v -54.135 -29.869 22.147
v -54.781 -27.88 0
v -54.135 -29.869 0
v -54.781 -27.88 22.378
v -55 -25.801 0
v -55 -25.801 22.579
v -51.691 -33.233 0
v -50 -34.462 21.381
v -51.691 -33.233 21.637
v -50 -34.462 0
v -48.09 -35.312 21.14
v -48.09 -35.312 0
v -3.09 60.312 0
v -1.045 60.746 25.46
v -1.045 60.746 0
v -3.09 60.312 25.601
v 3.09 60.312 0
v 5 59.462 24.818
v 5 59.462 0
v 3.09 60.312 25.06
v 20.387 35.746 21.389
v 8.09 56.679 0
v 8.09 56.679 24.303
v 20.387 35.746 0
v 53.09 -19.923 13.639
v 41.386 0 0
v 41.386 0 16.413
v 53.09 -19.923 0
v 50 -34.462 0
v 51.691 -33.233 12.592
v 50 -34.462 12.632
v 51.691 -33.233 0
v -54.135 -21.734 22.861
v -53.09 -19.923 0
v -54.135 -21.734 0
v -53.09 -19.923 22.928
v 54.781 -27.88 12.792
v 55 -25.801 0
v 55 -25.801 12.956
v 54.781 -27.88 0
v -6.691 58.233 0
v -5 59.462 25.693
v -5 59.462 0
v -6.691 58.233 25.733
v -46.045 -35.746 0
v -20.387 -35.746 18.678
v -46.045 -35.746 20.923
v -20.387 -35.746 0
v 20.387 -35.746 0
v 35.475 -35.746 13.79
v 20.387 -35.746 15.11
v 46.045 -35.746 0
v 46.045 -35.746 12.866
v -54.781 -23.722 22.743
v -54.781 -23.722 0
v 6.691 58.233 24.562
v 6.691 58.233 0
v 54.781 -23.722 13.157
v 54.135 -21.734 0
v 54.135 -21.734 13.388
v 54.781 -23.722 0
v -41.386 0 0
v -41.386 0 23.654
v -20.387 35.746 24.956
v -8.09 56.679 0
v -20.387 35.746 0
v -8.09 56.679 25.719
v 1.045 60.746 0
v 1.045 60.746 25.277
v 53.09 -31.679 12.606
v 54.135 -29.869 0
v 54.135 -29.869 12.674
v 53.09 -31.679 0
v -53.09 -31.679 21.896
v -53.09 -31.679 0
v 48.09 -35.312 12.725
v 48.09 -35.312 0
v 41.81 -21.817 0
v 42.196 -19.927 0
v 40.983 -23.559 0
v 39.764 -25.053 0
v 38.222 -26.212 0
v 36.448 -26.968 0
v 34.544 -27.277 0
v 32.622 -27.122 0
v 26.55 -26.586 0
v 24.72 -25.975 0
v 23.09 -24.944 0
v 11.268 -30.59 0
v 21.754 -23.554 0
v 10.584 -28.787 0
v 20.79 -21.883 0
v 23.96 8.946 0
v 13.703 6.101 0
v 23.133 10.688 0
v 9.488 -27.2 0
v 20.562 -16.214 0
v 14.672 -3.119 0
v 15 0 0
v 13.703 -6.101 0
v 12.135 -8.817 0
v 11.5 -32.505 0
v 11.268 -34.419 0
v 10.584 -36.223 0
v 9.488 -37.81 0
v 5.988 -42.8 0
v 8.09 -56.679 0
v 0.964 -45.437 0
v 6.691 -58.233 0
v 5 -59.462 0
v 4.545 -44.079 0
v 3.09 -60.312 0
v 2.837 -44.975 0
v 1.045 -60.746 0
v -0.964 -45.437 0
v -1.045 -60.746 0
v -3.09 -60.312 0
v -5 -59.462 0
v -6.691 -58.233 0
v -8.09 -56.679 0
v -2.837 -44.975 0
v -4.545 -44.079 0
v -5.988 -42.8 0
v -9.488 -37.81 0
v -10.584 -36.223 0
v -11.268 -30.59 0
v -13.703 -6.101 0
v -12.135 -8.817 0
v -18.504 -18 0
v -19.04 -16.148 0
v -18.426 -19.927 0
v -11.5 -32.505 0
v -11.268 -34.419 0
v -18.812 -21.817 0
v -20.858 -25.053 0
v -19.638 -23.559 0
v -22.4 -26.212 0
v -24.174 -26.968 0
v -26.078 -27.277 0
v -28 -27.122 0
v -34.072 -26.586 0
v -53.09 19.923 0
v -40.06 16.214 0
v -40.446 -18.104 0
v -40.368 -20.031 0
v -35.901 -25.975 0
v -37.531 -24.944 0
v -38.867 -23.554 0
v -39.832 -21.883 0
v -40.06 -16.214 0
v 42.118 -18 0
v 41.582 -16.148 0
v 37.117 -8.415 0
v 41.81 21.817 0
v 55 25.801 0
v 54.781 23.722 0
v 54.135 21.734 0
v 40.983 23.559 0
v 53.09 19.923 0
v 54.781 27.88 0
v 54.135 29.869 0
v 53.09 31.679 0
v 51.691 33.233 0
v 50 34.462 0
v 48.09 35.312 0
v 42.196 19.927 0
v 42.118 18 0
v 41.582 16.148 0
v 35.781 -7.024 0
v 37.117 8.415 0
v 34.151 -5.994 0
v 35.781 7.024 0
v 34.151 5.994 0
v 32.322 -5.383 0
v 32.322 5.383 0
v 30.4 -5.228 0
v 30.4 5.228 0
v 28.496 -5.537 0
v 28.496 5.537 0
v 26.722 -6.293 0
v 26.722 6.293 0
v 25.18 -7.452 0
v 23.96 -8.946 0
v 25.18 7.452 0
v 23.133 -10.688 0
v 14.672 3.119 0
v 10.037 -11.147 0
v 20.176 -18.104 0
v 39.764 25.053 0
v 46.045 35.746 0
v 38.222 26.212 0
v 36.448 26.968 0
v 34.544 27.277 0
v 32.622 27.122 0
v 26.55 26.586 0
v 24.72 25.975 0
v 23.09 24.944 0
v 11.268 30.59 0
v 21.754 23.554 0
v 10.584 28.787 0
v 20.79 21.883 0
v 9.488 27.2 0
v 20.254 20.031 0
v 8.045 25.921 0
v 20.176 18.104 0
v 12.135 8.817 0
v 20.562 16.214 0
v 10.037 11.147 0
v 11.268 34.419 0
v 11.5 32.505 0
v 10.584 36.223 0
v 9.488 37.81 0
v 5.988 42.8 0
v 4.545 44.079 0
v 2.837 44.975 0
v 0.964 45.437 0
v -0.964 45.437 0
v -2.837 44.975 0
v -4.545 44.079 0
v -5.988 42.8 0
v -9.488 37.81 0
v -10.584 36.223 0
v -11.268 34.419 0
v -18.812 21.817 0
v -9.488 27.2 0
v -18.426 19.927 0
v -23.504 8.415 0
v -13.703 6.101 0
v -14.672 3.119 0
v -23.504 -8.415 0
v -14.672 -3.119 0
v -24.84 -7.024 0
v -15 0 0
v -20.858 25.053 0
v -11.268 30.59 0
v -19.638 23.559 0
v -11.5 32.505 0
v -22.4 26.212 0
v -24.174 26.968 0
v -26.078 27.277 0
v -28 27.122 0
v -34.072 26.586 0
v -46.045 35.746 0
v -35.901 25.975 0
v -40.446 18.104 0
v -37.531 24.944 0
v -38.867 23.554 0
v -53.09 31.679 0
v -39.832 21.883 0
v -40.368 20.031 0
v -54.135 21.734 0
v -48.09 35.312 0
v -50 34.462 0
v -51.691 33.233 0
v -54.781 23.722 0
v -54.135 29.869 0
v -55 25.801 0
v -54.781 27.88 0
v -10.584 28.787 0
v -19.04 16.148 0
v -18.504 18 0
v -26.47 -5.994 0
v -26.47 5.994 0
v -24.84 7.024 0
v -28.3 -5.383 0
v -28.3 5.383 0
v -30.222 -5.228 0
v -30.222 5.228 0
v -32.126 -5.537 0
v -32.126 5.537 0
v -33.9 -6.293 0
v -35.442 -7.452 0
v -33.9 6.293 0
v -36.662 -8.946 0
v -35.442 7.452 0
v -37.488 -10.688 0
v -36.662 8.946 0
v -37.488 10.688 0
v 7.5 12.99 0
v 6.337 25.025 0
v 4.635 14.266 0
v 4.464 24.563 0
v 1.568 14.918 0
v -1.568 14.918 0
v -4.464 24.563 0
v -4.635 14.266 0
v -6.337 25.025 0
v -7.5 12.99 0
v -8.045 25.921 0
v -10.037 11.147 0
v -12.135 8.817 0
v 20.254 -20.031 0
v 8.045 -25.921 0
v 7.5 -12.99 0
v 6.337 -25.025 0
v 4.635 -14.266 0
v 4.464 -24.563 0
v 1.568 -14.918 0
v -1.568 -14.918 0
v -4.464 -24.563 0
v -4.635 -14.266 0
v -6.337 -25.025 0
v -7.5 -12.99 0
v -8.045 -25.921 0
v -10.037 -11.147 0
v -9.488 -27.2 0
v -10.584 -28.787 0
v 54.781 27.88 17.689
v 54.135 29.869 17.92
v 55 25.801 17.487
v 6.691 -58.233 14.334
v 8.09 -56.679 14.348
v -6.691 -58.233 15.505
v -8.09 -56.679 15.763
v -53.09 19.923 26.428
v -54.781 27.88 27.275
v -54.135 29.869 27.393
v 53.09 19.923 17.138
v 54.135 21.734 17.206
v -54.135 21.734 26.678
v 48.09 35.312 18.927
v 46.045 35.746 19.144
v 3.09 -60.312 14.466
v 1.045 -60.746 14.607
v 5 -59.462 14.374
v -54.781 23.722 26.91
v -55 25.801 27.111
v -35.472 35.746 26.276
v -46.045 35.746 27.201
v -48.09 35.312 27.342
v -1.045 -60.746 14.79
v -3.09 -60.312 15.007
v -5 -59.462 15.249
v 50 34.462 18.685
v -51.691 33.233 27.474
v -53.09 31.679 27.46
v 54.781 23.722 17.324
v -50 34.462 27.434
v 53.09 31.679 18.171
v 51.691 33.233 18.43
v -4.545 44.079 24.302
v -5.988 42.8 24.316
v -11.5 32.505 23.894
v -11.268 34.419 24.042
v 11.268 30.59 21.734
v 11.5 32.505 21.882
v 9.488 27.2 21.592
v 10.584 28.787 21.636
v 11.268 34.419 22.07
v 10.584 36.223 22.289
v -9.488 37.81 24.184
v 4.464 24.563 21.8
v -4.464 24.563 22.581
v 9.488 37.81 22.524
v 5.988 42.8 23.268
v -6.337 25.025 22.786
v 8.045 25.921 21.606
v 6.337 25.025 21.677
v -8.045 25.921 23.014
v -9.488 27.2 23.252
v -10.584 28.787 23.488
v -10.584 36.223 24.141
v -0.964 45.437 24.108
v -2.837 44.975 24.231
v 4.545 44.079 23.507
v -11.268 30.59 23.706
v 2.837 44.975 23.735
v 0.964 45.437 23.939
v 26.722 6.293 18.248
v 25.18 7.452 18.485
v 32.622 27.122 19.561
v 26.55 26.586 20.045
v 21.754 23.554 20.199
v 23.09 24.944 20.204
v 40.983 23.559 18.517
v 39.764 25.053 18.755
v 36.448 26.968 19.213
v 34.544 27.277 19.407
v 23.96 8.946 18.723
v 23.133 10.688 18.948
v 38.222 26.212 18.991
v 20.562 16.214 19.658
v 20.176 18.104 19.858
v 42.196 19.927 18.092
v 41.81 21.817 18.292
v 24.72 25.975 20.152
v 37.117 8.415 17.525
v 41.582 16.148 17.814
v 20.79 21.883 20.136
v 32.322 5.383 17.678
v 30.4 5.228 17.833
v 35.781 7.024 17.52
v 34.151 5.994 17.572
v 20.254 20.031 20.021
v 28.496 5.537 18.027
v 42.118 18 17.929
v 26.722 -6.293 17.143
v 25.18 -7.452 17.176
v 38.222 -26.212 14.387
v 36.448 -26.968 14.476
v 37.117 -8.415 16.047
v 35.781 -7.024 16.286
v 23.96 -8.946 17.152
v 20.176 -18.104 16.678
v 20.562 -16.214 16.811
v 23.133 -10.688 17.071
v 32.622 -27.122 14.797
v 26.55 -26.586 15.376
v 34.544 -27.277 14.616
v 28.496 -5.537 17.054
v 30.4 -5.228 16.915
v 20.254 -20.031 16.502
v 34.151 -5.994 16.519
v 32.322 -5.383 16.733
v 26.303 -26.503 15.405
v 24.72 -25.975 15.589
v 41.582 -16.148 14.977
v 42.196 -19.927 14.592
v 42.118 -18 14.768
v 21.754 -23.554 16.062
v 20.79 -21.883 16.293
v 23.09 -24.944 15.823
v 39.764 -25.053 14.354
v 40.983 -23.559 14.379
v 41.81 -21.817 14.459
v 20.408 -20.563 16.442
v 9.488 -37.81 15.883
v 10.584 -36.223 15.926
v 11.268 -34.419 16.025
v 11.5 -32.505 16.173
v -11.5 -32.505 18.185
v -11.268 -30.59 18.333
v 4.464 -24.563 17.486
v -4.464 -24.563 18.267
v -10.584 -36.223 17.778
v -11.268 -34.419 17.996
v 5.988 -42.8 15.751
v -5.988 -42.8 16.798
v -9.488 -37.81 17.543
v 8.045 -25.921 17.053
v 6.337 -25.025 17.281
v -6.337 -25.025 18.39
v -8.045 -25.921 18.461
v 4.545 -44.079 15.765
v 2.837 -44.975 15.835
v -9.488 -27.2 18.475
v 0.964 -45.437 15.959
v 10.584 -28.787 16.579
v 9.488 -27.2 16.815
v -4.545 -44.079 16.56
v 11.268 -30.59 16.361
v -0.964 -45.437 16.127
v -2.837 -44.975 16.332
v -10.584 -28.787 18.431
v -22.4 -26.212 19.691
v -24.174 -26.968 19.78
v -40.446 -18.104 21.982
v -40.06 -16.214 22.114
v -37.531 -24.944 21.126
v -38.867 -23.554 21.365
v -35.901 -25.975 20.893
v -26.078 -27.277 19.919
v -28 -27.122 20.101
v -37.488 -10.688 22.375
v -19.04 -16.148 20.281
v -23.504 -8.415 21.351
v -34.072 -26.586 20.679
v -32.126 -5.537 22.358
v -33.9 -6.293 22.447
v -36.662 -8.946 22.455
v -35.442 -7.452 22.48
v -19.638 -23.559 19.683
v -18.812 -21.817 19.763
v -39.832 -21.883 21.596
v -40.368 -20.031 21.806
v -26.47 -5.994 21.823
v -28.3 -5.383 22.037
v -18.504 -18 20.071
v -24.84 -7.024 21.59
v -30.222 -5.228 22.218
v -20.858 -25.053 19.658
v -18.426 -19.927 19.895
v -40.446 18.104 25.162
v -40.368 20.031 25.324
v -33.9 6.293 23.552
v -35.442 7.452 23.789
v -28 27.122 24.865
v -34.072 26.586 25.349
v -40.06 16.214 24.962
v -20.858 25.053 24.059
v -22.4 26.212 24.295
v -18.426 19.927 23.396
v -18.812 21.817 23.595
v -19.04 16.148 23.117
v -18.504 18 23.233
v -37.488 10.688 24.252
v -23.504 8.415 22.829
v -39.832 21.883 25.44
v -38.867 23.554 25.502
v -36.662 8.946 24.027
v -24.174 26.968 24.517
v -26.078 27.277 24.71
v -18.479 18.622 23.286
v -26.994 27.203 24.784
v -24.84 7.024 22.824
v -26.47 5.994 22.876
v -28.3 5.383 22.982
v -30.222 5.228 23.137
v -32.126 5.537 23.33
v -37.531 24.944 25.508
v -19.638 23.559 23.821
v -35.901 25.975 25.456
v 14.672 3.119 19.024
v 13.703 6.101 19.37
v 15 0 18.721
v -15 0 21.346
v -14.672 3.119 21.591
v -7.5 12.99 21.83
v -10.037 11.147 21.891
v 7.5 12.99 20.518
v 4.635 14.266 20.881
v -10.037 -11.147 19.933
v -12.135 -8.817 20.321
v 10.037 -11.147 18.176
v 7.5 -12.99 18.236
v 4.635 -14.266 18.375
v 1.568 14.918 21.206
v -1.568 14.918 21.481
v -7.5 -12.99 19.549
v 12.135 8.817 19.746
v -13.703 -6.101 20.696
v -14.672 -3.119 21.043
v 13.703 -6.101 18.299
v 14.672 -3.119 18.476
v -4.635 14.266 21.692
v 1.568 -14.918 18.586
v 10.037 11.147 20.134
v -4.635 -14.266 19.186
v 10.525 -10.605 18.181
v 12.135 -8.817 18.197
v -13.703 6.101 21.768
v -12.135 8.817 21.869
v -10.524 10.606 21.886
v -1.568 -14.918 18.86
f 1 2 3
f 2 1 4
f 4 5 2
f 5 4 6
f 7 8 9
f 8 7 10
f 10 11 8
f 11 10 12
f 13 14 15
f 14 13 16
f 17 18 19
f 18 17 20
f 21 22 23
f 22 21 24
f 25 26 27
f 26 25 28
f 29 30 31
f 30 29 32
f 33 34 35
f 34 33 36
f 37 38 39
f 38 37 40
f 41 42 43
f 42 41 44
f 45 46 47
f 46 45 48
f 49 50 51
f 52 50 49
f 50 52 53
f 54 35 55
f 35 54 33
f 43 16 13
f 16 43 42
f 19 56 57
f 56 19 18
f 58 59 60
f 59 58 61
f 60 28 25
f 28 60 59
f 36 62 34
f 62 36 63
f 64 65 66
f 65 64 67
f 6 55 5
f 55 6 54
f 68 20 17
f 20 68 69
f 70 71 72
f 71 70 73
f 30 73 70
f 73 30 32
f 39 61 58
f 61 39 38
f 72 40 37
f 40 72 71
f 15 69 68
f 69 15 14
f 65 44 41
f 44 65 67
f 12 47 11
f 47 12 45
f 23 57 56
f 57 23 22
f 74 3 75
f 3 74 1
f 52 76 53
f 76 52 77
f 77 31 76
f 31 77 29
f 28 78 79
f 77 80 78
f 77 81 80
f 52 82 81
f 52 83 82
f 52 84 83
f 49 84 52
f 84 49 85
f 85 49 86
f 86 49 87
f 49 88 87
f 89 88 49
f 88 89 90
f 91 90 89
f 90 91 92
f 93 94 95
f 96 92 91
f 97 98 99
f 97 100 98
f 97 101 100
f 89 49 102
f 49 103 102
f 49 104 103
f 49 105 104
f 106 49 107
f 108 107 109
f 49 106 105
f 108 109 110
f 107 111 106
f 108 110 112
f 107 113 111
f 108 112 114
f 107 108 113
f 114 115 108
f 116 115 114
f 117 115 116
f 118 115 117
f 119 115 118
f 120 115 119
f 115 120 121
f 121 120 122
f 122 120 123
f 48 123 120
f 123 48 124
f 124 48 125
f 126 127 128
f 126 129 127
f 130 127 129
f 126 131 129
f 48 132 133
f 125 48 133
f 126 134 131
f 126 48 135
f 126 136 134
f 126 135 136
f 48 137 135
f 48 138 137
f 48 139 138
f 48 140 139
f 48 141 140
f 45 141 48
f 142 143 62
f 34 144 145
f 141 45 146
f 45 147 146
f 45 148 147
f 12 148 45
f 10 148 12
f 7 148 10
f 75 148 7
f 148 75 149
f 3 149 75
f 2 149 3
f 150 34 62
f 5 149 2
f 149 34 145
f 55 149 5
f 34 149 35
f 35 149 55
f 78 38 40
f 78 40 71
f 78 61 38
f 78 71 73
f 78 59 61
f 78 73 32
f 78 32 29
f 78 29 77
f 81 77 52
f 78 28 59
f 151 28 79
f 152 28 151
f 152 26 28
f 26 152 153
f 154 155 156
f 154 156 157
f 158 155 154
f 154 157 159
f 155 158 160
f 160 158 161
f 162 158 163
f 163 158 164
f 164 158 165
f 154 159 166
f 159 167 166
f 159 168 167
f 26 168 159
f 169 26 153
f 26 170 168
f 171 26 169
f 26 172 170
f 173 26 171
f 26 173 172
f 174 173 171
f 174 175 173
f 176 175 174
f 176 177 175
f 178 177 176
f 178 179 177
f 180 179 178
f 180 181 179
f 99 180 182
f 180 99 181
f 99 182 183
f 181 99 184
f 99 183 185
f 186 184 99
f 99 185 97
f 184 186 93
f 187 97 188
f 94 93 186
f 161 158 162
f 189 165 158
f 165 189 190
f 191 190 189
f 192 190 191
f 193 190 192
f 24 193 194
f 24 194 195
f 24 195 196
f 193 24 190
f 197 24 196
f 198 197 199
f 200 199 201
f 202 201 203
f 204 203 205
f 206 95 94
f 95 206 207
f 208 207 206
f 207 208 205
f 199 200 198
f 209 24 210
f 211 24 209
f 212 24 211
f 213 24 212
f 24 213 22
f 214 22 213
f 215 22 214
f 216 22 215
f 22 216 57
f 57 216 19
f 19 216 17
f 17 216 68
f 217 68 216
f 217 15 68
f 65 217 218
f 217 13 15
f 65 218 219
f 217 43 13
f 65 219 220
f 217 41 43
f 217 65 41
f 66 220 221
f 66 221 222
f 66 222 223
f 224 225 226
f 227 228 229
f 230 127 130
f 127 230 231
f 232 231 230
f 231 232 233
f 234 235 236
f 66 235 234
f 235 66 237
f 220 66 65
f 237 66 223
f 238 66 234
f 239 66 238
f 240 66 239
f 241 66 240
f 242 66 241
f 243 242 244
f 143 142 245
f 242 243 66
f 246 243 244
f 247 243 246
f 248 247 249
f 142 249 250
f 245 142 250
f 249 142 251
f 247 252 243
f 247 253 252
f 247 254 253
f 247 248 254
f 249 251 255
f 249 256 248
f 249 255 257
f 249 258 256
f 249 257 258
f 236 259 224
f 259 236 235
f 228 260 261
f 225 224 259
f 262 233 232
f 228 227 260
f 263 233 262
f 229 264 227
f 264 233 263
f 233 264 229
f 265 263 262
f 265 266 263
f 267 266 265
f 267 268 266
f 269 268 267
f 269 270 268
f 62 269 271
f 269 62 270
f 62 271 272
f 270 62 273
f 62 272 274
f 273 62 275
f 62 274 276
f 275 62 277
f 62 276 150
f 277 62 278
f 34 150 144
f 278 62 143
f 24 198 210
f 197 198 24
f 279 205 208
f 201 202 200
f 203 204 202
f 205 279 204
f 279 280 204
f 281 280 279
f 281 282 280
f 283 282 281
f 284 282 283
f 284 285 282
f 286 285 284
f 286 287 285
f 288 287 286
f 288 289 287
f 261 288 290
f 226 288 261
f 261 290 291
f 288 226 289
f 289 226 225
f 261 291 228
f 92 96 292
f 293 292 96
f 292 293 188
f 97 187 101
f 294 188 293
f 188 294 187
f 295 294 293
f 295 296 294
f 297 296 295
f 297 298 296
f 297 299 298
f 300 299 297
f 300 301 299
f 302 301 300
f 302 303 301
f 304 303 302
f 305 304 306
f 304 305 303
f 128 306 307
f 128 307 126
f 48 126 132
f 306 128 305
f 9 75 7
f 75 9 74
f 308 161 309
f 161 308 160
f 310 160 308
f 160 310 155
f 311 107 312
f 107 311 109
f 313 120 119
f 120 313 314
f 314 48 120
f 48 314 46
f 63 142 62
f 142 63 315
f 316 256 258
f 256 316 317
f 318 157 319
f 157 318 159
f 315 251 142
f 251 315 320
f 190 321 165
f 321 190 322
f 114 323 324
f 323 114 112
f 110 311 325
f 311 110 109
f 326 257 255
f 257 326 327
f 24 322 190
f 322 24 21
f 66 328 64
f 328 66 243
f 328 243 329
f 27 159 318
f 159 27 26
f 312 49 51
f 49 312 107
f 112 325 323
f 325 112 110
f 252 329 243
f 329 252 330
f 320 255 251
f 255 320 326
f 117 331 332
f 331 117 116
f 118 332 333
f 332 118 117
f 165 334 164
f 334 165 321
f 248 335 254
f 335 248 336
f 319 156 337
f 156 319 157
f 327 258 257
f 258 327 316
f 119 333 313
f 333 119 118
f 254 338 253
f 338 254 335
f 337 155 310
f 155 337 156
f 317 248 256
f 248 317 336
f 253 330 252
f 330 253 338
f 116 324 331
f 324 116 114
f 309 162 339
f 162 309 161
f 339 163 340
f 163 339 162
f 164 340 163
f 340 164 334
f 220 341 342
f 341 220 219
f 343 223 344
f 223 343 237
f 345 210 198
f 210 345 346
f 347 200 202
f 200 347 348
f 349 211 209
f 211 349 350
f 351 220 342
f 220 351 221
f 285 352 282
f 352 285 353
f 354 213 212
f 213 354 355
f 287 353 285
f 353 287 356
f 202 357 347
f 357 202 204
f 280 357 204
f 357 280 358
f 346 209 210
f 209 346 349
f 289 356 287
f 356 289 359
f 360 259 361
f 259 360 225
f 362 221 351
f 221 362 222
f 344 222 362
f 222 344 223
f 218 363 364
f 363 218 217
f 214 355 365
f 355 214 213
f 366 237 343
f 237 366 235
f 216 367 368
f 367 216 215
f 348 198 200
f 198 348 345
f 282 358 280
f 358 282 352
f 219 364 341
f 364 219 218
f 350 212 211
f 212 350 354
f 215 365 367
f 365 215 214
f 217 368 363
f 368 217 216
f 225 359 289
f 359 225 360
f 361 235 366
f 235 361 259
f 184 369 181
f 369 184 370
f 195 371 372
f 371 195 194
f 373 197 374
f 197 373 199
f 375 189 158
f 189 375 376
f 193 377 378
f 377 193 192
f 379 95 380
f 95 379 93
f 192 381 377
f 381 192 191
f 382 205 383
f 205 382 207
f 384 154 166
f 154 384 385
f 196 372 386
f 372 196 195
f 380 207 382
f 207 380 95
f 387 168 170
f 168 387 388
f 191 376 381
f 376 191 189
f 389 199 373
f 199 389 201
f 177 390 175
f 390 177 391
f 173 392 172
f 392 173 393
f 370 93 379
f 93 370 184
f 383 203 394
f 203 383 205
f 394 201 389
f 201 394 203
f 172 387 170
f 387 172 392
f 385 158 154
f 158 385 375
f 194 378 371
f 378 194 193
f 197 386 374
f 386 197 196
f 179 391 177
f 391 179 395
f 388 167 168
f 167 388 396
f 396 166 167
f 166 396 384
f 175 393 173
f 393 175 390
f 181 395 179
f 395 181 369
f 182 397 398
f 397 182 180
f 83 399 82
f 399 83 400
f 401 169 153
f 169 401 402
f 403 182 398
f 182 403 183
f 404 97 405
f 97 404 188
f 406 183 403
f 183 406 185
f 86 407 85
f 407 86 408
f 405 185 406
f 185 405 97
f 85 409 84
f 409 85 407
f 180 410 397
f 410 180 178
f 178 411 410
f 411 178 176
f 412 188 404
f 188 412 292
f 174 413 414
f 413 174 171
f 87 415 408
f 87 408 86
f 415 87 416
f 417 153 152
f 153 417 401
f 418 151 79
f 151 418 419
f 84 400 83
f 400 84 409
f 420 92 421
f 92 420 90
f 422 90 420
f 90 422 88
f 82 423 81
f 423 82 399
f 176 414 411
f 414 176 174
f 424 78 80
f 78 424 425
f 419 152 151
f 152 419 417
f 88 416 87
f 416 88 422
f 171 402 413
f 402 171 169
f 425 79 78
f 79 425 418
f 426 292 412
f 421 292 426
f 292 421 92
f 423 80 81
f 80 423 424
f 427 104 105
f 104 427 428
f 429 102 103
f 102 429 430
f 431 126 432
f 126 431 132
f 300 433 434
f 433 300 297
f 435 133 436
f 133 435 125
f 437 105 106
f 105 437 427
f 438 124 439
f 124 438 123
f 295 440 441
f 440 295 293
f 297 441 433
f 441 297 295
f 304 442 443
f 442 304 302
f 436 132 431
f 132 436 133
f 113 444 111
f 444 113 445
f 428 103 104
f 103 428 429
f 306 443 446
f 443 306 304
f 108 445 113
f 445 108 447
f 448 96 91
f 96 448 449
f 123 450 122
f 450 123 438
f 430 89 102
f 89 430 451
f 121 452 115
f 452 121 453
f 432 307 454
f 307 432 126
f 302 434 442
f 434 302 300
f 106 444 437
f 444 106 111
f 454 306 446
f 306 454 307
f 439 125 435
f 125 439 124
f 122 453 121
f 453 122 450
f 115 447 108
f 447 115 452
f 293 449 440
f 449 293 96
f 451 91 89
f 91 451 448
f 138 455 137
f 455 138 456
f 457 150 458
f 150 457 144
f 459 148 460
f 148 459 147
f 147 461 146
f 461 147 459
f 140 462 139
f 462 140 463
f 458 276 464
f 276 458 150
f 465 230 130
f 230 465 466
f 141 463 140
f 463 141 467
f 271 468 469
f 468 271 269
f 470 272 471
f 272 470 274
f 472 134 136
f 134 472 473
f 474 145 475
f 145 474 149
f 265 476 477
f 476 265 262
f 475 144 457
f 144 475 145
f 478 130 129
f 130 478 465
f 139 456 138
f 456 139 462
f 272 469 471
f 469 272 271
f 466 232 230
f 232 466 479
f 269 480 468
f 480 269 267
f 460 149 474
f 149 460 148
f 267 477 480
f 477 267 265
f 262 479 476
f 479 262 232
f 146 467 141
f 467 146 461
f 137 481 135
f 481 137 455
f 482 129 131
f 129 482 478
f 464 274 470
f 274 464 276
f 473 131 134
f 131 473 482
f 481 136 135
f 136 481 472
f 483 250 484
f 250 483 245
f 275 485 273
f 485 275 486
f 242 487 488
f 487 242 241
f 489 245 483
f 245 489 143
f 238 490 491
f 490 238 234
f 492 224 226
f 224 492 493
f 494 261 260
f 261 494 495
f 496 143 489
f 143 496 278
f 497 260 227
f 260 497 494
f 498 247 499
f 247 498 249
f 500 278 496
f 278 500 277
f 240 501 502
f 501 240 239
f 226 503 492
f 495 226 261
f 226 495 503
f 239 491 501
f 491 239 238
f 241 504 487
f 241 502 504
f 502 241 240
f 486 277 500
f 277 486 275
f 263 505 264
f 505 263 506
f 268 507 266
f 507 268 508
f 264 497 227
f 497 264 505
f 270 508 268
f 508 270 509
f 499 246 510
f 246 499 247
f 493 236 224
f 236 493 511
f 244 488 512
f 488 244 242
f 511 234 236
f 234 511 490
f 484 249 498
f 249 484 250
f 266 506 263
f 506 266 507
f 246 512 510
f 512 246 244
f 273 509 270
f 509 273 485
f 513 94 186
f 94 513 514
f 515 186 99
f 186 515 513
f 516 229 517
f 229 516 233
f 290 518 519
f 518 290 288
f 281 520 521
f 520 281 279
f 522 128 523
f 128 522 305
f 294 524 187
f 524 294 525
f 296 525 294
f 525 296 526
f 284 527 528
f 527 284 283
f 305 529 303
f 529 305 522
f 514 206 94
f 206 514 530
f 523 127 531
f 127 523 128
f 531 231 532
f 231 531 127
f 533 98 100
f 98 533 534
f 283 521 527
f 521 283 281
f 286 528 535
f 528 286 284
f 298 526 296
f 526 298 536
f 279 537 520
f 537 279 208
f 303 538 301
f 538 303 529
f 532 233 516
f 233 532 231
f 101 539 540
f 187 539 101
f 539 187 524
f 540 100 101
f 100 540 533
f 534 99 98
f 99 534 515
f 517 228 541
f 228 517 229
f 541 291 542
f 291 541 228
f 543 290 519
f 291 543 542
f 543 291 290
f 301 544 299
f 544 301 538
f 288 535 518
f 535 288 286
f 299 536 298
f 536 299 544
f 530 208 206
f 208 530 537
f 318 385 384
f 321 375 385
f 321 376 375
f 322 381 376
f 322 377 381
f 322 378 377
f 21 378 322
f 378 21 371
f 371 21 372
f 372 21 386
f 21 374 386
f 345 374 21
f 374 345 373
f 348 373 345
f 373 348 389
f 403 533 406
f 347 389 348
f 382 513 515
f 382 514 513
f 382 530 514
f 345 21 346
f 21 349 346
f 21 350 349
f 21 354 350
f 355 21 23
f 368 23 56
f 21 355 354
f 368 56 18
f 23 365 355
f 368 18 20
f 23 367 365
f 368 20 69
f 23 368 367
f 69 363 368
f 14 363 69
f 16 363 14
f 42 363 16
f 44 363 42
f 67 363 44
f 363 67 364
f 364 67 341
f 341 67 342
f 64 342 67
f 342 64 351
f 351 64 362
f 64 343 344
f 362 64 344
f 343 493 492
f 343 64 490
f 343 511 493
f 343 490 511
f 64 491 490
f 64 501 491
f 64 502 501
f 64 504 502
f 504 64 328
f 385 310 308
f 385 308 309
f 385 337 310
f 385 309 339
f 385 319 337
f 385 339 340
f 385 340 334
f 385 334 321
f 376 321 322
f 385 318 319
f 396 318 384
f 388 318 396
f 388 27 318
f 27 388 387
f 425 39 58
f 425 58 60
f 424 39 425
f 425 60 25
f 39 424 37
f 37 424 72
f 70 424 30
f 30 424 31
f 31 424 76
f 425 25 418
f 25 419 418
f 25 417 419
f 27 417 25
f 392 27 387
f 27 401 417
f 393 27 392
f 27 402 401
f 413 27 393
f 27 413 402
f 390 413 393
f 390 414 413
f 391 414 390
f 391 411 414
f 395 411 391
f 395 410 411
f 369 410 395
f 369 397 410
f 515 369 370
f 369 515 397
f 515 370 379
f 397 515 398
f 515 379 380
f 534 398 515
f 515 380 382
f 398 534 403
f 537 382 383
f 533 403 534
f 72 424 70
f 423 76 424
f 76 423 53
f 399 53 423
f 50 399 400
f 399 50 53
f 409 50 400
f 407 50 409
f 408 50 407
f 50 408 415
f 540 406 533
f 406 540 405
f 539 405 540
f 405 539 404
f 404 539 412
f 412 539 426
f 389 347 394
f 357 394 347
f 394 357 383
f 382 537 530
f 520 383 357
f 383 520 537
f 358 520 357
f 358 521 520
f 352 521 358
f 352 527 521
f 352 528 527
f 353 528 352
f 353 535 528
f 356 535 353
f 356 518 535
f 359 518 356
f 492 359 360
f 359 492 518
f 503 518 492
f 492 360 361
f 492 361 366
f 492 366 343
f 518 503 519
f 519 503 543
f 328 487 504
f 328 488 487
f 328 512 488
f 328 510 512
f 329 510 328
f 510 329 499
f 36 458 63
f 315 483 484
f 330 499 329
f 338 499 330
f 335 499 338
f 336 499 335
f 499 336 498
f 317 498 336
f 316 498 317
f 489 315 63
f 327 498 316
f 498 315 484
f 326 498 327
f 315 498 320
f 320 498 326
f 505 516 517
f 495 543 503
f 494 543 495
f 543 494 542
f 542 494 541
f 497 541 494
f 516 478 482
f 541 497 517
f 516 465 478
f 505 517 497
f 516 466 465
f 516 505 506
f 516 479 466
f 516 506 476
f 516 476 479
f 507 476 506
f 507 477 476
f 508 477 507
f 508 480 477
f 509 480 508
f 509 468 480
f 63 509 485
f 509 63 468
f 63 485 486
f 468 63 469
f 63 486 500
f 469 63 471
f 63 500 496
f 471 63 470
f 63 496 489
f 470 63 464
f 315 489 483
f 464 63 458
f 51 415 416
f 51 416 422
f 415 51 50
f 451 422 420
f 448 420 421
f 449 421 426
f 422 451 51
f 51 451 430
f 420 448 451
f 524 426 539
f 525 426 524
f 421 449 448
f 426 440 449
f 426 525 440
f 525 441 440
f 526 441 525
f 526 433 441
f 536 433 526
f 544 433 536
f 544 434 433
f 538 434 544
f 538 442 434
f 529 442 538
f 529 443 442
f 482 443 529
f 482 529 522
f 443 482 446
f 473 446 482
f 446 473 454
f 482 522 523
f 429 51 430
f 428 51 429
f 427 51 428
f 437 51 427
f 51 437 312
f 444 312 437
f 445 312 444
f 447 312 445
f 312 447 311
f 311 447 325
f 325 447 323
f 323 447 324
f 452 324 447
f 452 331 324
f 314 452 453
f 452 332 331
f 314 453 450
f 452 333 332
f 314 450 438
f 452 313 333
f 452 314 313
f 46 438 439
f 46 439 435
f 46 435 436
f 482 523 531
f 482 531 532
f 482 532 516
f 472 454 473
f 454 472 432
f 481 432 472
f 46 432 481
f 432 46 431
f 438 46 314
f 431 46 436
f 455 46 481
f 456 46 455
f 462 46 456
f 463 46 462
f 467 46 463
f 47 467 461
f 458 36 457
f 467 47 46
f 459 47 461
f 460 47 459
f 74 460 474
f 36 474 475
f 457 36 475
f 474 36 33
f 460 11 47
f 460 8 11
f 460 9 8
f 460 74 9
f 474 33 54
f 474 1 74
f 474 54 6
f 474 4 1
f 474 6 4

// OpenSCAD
module roundedTriangle(side_length, radius, height) {
  // extrude the shape through z
  linear_extrude(height=height)
  hull() {
    // place 4 circles in the corners the convex hull algorithm
    // will wrap around them

    tri_height = side_length * sin(60);

    // BOTTOM LEFT
    translate([(-side_length / 2 + radius/2), (-tri_height/2 + radius/2), 0])
    circle(r=radius);

    // BOTTOM RIGHT
    translate([(side_length / 2 - radius/2), (-tri_height/2 + radius/2), 0])
    circle(r=radius);

    // TOP
    translate([0, (tri_height/2 - radius/2), 0])
    circle(r=radius);
  }
}

tsl = 100;
shift = 8;

tsl_s = 15;
shift_s = 35;

z_height = 30;

difference() {

  difference() {
    union() {
      translate([0, tsl / shift, 0])
      roundedTriangle(tsl, 10, z_height);

      translate([0, -tsl / shift, 0])
      rotate([0, 0, 180])
      roundedTriangle(tsl, 10, z_height);
    }

    translate([0, 0, -1])
    union() {
      // top
      translate([cos(90) * shift_s, sin(90) * shift_s, 0])
      roundedTriangle(tsl_s, 8, z_height);

      // top right
      translate([cos(30) * shift_s, sin(30) * shift_s, 0])
      rotate([0, 0, 60])
      roundedTriangle(tsl_s, 8, z_height);

      // bottom right
      translate([cos(30) * shift_s, -sin(30) * shift_s, 0])
      rotate([0, 0, 120])
      roundedTriangle(tsl_s, 8, z_height);

      // bottom
      translate([cos(90) * shift_s, -sin(90) * shift_s, 0])
      rotate([0, 0, 180])
      roundedTriangle(tsl_s, 8, z_height);

      // bottom left
      translate([-cos(30) * shift_s, -sin(30) * shift_s, 0])
      rotate([0, 0, 120])
      roundedTriangle(tsl_s, 8, z_height);

      // top left
      translate([-cos(30) * shift_s, sin(30) * shift_s, 0])
      rotate([0, 0, 60])
      roundedTriangle(tsl_s, 8, z_height);

      // center
      linear_extrude(height=z_height)
      circle(r=tsl_s);
    }
  }

  translate([-100, -100, 20])
  rotate([5, 5, 0])
  cube([200, 200, 20]);
}
